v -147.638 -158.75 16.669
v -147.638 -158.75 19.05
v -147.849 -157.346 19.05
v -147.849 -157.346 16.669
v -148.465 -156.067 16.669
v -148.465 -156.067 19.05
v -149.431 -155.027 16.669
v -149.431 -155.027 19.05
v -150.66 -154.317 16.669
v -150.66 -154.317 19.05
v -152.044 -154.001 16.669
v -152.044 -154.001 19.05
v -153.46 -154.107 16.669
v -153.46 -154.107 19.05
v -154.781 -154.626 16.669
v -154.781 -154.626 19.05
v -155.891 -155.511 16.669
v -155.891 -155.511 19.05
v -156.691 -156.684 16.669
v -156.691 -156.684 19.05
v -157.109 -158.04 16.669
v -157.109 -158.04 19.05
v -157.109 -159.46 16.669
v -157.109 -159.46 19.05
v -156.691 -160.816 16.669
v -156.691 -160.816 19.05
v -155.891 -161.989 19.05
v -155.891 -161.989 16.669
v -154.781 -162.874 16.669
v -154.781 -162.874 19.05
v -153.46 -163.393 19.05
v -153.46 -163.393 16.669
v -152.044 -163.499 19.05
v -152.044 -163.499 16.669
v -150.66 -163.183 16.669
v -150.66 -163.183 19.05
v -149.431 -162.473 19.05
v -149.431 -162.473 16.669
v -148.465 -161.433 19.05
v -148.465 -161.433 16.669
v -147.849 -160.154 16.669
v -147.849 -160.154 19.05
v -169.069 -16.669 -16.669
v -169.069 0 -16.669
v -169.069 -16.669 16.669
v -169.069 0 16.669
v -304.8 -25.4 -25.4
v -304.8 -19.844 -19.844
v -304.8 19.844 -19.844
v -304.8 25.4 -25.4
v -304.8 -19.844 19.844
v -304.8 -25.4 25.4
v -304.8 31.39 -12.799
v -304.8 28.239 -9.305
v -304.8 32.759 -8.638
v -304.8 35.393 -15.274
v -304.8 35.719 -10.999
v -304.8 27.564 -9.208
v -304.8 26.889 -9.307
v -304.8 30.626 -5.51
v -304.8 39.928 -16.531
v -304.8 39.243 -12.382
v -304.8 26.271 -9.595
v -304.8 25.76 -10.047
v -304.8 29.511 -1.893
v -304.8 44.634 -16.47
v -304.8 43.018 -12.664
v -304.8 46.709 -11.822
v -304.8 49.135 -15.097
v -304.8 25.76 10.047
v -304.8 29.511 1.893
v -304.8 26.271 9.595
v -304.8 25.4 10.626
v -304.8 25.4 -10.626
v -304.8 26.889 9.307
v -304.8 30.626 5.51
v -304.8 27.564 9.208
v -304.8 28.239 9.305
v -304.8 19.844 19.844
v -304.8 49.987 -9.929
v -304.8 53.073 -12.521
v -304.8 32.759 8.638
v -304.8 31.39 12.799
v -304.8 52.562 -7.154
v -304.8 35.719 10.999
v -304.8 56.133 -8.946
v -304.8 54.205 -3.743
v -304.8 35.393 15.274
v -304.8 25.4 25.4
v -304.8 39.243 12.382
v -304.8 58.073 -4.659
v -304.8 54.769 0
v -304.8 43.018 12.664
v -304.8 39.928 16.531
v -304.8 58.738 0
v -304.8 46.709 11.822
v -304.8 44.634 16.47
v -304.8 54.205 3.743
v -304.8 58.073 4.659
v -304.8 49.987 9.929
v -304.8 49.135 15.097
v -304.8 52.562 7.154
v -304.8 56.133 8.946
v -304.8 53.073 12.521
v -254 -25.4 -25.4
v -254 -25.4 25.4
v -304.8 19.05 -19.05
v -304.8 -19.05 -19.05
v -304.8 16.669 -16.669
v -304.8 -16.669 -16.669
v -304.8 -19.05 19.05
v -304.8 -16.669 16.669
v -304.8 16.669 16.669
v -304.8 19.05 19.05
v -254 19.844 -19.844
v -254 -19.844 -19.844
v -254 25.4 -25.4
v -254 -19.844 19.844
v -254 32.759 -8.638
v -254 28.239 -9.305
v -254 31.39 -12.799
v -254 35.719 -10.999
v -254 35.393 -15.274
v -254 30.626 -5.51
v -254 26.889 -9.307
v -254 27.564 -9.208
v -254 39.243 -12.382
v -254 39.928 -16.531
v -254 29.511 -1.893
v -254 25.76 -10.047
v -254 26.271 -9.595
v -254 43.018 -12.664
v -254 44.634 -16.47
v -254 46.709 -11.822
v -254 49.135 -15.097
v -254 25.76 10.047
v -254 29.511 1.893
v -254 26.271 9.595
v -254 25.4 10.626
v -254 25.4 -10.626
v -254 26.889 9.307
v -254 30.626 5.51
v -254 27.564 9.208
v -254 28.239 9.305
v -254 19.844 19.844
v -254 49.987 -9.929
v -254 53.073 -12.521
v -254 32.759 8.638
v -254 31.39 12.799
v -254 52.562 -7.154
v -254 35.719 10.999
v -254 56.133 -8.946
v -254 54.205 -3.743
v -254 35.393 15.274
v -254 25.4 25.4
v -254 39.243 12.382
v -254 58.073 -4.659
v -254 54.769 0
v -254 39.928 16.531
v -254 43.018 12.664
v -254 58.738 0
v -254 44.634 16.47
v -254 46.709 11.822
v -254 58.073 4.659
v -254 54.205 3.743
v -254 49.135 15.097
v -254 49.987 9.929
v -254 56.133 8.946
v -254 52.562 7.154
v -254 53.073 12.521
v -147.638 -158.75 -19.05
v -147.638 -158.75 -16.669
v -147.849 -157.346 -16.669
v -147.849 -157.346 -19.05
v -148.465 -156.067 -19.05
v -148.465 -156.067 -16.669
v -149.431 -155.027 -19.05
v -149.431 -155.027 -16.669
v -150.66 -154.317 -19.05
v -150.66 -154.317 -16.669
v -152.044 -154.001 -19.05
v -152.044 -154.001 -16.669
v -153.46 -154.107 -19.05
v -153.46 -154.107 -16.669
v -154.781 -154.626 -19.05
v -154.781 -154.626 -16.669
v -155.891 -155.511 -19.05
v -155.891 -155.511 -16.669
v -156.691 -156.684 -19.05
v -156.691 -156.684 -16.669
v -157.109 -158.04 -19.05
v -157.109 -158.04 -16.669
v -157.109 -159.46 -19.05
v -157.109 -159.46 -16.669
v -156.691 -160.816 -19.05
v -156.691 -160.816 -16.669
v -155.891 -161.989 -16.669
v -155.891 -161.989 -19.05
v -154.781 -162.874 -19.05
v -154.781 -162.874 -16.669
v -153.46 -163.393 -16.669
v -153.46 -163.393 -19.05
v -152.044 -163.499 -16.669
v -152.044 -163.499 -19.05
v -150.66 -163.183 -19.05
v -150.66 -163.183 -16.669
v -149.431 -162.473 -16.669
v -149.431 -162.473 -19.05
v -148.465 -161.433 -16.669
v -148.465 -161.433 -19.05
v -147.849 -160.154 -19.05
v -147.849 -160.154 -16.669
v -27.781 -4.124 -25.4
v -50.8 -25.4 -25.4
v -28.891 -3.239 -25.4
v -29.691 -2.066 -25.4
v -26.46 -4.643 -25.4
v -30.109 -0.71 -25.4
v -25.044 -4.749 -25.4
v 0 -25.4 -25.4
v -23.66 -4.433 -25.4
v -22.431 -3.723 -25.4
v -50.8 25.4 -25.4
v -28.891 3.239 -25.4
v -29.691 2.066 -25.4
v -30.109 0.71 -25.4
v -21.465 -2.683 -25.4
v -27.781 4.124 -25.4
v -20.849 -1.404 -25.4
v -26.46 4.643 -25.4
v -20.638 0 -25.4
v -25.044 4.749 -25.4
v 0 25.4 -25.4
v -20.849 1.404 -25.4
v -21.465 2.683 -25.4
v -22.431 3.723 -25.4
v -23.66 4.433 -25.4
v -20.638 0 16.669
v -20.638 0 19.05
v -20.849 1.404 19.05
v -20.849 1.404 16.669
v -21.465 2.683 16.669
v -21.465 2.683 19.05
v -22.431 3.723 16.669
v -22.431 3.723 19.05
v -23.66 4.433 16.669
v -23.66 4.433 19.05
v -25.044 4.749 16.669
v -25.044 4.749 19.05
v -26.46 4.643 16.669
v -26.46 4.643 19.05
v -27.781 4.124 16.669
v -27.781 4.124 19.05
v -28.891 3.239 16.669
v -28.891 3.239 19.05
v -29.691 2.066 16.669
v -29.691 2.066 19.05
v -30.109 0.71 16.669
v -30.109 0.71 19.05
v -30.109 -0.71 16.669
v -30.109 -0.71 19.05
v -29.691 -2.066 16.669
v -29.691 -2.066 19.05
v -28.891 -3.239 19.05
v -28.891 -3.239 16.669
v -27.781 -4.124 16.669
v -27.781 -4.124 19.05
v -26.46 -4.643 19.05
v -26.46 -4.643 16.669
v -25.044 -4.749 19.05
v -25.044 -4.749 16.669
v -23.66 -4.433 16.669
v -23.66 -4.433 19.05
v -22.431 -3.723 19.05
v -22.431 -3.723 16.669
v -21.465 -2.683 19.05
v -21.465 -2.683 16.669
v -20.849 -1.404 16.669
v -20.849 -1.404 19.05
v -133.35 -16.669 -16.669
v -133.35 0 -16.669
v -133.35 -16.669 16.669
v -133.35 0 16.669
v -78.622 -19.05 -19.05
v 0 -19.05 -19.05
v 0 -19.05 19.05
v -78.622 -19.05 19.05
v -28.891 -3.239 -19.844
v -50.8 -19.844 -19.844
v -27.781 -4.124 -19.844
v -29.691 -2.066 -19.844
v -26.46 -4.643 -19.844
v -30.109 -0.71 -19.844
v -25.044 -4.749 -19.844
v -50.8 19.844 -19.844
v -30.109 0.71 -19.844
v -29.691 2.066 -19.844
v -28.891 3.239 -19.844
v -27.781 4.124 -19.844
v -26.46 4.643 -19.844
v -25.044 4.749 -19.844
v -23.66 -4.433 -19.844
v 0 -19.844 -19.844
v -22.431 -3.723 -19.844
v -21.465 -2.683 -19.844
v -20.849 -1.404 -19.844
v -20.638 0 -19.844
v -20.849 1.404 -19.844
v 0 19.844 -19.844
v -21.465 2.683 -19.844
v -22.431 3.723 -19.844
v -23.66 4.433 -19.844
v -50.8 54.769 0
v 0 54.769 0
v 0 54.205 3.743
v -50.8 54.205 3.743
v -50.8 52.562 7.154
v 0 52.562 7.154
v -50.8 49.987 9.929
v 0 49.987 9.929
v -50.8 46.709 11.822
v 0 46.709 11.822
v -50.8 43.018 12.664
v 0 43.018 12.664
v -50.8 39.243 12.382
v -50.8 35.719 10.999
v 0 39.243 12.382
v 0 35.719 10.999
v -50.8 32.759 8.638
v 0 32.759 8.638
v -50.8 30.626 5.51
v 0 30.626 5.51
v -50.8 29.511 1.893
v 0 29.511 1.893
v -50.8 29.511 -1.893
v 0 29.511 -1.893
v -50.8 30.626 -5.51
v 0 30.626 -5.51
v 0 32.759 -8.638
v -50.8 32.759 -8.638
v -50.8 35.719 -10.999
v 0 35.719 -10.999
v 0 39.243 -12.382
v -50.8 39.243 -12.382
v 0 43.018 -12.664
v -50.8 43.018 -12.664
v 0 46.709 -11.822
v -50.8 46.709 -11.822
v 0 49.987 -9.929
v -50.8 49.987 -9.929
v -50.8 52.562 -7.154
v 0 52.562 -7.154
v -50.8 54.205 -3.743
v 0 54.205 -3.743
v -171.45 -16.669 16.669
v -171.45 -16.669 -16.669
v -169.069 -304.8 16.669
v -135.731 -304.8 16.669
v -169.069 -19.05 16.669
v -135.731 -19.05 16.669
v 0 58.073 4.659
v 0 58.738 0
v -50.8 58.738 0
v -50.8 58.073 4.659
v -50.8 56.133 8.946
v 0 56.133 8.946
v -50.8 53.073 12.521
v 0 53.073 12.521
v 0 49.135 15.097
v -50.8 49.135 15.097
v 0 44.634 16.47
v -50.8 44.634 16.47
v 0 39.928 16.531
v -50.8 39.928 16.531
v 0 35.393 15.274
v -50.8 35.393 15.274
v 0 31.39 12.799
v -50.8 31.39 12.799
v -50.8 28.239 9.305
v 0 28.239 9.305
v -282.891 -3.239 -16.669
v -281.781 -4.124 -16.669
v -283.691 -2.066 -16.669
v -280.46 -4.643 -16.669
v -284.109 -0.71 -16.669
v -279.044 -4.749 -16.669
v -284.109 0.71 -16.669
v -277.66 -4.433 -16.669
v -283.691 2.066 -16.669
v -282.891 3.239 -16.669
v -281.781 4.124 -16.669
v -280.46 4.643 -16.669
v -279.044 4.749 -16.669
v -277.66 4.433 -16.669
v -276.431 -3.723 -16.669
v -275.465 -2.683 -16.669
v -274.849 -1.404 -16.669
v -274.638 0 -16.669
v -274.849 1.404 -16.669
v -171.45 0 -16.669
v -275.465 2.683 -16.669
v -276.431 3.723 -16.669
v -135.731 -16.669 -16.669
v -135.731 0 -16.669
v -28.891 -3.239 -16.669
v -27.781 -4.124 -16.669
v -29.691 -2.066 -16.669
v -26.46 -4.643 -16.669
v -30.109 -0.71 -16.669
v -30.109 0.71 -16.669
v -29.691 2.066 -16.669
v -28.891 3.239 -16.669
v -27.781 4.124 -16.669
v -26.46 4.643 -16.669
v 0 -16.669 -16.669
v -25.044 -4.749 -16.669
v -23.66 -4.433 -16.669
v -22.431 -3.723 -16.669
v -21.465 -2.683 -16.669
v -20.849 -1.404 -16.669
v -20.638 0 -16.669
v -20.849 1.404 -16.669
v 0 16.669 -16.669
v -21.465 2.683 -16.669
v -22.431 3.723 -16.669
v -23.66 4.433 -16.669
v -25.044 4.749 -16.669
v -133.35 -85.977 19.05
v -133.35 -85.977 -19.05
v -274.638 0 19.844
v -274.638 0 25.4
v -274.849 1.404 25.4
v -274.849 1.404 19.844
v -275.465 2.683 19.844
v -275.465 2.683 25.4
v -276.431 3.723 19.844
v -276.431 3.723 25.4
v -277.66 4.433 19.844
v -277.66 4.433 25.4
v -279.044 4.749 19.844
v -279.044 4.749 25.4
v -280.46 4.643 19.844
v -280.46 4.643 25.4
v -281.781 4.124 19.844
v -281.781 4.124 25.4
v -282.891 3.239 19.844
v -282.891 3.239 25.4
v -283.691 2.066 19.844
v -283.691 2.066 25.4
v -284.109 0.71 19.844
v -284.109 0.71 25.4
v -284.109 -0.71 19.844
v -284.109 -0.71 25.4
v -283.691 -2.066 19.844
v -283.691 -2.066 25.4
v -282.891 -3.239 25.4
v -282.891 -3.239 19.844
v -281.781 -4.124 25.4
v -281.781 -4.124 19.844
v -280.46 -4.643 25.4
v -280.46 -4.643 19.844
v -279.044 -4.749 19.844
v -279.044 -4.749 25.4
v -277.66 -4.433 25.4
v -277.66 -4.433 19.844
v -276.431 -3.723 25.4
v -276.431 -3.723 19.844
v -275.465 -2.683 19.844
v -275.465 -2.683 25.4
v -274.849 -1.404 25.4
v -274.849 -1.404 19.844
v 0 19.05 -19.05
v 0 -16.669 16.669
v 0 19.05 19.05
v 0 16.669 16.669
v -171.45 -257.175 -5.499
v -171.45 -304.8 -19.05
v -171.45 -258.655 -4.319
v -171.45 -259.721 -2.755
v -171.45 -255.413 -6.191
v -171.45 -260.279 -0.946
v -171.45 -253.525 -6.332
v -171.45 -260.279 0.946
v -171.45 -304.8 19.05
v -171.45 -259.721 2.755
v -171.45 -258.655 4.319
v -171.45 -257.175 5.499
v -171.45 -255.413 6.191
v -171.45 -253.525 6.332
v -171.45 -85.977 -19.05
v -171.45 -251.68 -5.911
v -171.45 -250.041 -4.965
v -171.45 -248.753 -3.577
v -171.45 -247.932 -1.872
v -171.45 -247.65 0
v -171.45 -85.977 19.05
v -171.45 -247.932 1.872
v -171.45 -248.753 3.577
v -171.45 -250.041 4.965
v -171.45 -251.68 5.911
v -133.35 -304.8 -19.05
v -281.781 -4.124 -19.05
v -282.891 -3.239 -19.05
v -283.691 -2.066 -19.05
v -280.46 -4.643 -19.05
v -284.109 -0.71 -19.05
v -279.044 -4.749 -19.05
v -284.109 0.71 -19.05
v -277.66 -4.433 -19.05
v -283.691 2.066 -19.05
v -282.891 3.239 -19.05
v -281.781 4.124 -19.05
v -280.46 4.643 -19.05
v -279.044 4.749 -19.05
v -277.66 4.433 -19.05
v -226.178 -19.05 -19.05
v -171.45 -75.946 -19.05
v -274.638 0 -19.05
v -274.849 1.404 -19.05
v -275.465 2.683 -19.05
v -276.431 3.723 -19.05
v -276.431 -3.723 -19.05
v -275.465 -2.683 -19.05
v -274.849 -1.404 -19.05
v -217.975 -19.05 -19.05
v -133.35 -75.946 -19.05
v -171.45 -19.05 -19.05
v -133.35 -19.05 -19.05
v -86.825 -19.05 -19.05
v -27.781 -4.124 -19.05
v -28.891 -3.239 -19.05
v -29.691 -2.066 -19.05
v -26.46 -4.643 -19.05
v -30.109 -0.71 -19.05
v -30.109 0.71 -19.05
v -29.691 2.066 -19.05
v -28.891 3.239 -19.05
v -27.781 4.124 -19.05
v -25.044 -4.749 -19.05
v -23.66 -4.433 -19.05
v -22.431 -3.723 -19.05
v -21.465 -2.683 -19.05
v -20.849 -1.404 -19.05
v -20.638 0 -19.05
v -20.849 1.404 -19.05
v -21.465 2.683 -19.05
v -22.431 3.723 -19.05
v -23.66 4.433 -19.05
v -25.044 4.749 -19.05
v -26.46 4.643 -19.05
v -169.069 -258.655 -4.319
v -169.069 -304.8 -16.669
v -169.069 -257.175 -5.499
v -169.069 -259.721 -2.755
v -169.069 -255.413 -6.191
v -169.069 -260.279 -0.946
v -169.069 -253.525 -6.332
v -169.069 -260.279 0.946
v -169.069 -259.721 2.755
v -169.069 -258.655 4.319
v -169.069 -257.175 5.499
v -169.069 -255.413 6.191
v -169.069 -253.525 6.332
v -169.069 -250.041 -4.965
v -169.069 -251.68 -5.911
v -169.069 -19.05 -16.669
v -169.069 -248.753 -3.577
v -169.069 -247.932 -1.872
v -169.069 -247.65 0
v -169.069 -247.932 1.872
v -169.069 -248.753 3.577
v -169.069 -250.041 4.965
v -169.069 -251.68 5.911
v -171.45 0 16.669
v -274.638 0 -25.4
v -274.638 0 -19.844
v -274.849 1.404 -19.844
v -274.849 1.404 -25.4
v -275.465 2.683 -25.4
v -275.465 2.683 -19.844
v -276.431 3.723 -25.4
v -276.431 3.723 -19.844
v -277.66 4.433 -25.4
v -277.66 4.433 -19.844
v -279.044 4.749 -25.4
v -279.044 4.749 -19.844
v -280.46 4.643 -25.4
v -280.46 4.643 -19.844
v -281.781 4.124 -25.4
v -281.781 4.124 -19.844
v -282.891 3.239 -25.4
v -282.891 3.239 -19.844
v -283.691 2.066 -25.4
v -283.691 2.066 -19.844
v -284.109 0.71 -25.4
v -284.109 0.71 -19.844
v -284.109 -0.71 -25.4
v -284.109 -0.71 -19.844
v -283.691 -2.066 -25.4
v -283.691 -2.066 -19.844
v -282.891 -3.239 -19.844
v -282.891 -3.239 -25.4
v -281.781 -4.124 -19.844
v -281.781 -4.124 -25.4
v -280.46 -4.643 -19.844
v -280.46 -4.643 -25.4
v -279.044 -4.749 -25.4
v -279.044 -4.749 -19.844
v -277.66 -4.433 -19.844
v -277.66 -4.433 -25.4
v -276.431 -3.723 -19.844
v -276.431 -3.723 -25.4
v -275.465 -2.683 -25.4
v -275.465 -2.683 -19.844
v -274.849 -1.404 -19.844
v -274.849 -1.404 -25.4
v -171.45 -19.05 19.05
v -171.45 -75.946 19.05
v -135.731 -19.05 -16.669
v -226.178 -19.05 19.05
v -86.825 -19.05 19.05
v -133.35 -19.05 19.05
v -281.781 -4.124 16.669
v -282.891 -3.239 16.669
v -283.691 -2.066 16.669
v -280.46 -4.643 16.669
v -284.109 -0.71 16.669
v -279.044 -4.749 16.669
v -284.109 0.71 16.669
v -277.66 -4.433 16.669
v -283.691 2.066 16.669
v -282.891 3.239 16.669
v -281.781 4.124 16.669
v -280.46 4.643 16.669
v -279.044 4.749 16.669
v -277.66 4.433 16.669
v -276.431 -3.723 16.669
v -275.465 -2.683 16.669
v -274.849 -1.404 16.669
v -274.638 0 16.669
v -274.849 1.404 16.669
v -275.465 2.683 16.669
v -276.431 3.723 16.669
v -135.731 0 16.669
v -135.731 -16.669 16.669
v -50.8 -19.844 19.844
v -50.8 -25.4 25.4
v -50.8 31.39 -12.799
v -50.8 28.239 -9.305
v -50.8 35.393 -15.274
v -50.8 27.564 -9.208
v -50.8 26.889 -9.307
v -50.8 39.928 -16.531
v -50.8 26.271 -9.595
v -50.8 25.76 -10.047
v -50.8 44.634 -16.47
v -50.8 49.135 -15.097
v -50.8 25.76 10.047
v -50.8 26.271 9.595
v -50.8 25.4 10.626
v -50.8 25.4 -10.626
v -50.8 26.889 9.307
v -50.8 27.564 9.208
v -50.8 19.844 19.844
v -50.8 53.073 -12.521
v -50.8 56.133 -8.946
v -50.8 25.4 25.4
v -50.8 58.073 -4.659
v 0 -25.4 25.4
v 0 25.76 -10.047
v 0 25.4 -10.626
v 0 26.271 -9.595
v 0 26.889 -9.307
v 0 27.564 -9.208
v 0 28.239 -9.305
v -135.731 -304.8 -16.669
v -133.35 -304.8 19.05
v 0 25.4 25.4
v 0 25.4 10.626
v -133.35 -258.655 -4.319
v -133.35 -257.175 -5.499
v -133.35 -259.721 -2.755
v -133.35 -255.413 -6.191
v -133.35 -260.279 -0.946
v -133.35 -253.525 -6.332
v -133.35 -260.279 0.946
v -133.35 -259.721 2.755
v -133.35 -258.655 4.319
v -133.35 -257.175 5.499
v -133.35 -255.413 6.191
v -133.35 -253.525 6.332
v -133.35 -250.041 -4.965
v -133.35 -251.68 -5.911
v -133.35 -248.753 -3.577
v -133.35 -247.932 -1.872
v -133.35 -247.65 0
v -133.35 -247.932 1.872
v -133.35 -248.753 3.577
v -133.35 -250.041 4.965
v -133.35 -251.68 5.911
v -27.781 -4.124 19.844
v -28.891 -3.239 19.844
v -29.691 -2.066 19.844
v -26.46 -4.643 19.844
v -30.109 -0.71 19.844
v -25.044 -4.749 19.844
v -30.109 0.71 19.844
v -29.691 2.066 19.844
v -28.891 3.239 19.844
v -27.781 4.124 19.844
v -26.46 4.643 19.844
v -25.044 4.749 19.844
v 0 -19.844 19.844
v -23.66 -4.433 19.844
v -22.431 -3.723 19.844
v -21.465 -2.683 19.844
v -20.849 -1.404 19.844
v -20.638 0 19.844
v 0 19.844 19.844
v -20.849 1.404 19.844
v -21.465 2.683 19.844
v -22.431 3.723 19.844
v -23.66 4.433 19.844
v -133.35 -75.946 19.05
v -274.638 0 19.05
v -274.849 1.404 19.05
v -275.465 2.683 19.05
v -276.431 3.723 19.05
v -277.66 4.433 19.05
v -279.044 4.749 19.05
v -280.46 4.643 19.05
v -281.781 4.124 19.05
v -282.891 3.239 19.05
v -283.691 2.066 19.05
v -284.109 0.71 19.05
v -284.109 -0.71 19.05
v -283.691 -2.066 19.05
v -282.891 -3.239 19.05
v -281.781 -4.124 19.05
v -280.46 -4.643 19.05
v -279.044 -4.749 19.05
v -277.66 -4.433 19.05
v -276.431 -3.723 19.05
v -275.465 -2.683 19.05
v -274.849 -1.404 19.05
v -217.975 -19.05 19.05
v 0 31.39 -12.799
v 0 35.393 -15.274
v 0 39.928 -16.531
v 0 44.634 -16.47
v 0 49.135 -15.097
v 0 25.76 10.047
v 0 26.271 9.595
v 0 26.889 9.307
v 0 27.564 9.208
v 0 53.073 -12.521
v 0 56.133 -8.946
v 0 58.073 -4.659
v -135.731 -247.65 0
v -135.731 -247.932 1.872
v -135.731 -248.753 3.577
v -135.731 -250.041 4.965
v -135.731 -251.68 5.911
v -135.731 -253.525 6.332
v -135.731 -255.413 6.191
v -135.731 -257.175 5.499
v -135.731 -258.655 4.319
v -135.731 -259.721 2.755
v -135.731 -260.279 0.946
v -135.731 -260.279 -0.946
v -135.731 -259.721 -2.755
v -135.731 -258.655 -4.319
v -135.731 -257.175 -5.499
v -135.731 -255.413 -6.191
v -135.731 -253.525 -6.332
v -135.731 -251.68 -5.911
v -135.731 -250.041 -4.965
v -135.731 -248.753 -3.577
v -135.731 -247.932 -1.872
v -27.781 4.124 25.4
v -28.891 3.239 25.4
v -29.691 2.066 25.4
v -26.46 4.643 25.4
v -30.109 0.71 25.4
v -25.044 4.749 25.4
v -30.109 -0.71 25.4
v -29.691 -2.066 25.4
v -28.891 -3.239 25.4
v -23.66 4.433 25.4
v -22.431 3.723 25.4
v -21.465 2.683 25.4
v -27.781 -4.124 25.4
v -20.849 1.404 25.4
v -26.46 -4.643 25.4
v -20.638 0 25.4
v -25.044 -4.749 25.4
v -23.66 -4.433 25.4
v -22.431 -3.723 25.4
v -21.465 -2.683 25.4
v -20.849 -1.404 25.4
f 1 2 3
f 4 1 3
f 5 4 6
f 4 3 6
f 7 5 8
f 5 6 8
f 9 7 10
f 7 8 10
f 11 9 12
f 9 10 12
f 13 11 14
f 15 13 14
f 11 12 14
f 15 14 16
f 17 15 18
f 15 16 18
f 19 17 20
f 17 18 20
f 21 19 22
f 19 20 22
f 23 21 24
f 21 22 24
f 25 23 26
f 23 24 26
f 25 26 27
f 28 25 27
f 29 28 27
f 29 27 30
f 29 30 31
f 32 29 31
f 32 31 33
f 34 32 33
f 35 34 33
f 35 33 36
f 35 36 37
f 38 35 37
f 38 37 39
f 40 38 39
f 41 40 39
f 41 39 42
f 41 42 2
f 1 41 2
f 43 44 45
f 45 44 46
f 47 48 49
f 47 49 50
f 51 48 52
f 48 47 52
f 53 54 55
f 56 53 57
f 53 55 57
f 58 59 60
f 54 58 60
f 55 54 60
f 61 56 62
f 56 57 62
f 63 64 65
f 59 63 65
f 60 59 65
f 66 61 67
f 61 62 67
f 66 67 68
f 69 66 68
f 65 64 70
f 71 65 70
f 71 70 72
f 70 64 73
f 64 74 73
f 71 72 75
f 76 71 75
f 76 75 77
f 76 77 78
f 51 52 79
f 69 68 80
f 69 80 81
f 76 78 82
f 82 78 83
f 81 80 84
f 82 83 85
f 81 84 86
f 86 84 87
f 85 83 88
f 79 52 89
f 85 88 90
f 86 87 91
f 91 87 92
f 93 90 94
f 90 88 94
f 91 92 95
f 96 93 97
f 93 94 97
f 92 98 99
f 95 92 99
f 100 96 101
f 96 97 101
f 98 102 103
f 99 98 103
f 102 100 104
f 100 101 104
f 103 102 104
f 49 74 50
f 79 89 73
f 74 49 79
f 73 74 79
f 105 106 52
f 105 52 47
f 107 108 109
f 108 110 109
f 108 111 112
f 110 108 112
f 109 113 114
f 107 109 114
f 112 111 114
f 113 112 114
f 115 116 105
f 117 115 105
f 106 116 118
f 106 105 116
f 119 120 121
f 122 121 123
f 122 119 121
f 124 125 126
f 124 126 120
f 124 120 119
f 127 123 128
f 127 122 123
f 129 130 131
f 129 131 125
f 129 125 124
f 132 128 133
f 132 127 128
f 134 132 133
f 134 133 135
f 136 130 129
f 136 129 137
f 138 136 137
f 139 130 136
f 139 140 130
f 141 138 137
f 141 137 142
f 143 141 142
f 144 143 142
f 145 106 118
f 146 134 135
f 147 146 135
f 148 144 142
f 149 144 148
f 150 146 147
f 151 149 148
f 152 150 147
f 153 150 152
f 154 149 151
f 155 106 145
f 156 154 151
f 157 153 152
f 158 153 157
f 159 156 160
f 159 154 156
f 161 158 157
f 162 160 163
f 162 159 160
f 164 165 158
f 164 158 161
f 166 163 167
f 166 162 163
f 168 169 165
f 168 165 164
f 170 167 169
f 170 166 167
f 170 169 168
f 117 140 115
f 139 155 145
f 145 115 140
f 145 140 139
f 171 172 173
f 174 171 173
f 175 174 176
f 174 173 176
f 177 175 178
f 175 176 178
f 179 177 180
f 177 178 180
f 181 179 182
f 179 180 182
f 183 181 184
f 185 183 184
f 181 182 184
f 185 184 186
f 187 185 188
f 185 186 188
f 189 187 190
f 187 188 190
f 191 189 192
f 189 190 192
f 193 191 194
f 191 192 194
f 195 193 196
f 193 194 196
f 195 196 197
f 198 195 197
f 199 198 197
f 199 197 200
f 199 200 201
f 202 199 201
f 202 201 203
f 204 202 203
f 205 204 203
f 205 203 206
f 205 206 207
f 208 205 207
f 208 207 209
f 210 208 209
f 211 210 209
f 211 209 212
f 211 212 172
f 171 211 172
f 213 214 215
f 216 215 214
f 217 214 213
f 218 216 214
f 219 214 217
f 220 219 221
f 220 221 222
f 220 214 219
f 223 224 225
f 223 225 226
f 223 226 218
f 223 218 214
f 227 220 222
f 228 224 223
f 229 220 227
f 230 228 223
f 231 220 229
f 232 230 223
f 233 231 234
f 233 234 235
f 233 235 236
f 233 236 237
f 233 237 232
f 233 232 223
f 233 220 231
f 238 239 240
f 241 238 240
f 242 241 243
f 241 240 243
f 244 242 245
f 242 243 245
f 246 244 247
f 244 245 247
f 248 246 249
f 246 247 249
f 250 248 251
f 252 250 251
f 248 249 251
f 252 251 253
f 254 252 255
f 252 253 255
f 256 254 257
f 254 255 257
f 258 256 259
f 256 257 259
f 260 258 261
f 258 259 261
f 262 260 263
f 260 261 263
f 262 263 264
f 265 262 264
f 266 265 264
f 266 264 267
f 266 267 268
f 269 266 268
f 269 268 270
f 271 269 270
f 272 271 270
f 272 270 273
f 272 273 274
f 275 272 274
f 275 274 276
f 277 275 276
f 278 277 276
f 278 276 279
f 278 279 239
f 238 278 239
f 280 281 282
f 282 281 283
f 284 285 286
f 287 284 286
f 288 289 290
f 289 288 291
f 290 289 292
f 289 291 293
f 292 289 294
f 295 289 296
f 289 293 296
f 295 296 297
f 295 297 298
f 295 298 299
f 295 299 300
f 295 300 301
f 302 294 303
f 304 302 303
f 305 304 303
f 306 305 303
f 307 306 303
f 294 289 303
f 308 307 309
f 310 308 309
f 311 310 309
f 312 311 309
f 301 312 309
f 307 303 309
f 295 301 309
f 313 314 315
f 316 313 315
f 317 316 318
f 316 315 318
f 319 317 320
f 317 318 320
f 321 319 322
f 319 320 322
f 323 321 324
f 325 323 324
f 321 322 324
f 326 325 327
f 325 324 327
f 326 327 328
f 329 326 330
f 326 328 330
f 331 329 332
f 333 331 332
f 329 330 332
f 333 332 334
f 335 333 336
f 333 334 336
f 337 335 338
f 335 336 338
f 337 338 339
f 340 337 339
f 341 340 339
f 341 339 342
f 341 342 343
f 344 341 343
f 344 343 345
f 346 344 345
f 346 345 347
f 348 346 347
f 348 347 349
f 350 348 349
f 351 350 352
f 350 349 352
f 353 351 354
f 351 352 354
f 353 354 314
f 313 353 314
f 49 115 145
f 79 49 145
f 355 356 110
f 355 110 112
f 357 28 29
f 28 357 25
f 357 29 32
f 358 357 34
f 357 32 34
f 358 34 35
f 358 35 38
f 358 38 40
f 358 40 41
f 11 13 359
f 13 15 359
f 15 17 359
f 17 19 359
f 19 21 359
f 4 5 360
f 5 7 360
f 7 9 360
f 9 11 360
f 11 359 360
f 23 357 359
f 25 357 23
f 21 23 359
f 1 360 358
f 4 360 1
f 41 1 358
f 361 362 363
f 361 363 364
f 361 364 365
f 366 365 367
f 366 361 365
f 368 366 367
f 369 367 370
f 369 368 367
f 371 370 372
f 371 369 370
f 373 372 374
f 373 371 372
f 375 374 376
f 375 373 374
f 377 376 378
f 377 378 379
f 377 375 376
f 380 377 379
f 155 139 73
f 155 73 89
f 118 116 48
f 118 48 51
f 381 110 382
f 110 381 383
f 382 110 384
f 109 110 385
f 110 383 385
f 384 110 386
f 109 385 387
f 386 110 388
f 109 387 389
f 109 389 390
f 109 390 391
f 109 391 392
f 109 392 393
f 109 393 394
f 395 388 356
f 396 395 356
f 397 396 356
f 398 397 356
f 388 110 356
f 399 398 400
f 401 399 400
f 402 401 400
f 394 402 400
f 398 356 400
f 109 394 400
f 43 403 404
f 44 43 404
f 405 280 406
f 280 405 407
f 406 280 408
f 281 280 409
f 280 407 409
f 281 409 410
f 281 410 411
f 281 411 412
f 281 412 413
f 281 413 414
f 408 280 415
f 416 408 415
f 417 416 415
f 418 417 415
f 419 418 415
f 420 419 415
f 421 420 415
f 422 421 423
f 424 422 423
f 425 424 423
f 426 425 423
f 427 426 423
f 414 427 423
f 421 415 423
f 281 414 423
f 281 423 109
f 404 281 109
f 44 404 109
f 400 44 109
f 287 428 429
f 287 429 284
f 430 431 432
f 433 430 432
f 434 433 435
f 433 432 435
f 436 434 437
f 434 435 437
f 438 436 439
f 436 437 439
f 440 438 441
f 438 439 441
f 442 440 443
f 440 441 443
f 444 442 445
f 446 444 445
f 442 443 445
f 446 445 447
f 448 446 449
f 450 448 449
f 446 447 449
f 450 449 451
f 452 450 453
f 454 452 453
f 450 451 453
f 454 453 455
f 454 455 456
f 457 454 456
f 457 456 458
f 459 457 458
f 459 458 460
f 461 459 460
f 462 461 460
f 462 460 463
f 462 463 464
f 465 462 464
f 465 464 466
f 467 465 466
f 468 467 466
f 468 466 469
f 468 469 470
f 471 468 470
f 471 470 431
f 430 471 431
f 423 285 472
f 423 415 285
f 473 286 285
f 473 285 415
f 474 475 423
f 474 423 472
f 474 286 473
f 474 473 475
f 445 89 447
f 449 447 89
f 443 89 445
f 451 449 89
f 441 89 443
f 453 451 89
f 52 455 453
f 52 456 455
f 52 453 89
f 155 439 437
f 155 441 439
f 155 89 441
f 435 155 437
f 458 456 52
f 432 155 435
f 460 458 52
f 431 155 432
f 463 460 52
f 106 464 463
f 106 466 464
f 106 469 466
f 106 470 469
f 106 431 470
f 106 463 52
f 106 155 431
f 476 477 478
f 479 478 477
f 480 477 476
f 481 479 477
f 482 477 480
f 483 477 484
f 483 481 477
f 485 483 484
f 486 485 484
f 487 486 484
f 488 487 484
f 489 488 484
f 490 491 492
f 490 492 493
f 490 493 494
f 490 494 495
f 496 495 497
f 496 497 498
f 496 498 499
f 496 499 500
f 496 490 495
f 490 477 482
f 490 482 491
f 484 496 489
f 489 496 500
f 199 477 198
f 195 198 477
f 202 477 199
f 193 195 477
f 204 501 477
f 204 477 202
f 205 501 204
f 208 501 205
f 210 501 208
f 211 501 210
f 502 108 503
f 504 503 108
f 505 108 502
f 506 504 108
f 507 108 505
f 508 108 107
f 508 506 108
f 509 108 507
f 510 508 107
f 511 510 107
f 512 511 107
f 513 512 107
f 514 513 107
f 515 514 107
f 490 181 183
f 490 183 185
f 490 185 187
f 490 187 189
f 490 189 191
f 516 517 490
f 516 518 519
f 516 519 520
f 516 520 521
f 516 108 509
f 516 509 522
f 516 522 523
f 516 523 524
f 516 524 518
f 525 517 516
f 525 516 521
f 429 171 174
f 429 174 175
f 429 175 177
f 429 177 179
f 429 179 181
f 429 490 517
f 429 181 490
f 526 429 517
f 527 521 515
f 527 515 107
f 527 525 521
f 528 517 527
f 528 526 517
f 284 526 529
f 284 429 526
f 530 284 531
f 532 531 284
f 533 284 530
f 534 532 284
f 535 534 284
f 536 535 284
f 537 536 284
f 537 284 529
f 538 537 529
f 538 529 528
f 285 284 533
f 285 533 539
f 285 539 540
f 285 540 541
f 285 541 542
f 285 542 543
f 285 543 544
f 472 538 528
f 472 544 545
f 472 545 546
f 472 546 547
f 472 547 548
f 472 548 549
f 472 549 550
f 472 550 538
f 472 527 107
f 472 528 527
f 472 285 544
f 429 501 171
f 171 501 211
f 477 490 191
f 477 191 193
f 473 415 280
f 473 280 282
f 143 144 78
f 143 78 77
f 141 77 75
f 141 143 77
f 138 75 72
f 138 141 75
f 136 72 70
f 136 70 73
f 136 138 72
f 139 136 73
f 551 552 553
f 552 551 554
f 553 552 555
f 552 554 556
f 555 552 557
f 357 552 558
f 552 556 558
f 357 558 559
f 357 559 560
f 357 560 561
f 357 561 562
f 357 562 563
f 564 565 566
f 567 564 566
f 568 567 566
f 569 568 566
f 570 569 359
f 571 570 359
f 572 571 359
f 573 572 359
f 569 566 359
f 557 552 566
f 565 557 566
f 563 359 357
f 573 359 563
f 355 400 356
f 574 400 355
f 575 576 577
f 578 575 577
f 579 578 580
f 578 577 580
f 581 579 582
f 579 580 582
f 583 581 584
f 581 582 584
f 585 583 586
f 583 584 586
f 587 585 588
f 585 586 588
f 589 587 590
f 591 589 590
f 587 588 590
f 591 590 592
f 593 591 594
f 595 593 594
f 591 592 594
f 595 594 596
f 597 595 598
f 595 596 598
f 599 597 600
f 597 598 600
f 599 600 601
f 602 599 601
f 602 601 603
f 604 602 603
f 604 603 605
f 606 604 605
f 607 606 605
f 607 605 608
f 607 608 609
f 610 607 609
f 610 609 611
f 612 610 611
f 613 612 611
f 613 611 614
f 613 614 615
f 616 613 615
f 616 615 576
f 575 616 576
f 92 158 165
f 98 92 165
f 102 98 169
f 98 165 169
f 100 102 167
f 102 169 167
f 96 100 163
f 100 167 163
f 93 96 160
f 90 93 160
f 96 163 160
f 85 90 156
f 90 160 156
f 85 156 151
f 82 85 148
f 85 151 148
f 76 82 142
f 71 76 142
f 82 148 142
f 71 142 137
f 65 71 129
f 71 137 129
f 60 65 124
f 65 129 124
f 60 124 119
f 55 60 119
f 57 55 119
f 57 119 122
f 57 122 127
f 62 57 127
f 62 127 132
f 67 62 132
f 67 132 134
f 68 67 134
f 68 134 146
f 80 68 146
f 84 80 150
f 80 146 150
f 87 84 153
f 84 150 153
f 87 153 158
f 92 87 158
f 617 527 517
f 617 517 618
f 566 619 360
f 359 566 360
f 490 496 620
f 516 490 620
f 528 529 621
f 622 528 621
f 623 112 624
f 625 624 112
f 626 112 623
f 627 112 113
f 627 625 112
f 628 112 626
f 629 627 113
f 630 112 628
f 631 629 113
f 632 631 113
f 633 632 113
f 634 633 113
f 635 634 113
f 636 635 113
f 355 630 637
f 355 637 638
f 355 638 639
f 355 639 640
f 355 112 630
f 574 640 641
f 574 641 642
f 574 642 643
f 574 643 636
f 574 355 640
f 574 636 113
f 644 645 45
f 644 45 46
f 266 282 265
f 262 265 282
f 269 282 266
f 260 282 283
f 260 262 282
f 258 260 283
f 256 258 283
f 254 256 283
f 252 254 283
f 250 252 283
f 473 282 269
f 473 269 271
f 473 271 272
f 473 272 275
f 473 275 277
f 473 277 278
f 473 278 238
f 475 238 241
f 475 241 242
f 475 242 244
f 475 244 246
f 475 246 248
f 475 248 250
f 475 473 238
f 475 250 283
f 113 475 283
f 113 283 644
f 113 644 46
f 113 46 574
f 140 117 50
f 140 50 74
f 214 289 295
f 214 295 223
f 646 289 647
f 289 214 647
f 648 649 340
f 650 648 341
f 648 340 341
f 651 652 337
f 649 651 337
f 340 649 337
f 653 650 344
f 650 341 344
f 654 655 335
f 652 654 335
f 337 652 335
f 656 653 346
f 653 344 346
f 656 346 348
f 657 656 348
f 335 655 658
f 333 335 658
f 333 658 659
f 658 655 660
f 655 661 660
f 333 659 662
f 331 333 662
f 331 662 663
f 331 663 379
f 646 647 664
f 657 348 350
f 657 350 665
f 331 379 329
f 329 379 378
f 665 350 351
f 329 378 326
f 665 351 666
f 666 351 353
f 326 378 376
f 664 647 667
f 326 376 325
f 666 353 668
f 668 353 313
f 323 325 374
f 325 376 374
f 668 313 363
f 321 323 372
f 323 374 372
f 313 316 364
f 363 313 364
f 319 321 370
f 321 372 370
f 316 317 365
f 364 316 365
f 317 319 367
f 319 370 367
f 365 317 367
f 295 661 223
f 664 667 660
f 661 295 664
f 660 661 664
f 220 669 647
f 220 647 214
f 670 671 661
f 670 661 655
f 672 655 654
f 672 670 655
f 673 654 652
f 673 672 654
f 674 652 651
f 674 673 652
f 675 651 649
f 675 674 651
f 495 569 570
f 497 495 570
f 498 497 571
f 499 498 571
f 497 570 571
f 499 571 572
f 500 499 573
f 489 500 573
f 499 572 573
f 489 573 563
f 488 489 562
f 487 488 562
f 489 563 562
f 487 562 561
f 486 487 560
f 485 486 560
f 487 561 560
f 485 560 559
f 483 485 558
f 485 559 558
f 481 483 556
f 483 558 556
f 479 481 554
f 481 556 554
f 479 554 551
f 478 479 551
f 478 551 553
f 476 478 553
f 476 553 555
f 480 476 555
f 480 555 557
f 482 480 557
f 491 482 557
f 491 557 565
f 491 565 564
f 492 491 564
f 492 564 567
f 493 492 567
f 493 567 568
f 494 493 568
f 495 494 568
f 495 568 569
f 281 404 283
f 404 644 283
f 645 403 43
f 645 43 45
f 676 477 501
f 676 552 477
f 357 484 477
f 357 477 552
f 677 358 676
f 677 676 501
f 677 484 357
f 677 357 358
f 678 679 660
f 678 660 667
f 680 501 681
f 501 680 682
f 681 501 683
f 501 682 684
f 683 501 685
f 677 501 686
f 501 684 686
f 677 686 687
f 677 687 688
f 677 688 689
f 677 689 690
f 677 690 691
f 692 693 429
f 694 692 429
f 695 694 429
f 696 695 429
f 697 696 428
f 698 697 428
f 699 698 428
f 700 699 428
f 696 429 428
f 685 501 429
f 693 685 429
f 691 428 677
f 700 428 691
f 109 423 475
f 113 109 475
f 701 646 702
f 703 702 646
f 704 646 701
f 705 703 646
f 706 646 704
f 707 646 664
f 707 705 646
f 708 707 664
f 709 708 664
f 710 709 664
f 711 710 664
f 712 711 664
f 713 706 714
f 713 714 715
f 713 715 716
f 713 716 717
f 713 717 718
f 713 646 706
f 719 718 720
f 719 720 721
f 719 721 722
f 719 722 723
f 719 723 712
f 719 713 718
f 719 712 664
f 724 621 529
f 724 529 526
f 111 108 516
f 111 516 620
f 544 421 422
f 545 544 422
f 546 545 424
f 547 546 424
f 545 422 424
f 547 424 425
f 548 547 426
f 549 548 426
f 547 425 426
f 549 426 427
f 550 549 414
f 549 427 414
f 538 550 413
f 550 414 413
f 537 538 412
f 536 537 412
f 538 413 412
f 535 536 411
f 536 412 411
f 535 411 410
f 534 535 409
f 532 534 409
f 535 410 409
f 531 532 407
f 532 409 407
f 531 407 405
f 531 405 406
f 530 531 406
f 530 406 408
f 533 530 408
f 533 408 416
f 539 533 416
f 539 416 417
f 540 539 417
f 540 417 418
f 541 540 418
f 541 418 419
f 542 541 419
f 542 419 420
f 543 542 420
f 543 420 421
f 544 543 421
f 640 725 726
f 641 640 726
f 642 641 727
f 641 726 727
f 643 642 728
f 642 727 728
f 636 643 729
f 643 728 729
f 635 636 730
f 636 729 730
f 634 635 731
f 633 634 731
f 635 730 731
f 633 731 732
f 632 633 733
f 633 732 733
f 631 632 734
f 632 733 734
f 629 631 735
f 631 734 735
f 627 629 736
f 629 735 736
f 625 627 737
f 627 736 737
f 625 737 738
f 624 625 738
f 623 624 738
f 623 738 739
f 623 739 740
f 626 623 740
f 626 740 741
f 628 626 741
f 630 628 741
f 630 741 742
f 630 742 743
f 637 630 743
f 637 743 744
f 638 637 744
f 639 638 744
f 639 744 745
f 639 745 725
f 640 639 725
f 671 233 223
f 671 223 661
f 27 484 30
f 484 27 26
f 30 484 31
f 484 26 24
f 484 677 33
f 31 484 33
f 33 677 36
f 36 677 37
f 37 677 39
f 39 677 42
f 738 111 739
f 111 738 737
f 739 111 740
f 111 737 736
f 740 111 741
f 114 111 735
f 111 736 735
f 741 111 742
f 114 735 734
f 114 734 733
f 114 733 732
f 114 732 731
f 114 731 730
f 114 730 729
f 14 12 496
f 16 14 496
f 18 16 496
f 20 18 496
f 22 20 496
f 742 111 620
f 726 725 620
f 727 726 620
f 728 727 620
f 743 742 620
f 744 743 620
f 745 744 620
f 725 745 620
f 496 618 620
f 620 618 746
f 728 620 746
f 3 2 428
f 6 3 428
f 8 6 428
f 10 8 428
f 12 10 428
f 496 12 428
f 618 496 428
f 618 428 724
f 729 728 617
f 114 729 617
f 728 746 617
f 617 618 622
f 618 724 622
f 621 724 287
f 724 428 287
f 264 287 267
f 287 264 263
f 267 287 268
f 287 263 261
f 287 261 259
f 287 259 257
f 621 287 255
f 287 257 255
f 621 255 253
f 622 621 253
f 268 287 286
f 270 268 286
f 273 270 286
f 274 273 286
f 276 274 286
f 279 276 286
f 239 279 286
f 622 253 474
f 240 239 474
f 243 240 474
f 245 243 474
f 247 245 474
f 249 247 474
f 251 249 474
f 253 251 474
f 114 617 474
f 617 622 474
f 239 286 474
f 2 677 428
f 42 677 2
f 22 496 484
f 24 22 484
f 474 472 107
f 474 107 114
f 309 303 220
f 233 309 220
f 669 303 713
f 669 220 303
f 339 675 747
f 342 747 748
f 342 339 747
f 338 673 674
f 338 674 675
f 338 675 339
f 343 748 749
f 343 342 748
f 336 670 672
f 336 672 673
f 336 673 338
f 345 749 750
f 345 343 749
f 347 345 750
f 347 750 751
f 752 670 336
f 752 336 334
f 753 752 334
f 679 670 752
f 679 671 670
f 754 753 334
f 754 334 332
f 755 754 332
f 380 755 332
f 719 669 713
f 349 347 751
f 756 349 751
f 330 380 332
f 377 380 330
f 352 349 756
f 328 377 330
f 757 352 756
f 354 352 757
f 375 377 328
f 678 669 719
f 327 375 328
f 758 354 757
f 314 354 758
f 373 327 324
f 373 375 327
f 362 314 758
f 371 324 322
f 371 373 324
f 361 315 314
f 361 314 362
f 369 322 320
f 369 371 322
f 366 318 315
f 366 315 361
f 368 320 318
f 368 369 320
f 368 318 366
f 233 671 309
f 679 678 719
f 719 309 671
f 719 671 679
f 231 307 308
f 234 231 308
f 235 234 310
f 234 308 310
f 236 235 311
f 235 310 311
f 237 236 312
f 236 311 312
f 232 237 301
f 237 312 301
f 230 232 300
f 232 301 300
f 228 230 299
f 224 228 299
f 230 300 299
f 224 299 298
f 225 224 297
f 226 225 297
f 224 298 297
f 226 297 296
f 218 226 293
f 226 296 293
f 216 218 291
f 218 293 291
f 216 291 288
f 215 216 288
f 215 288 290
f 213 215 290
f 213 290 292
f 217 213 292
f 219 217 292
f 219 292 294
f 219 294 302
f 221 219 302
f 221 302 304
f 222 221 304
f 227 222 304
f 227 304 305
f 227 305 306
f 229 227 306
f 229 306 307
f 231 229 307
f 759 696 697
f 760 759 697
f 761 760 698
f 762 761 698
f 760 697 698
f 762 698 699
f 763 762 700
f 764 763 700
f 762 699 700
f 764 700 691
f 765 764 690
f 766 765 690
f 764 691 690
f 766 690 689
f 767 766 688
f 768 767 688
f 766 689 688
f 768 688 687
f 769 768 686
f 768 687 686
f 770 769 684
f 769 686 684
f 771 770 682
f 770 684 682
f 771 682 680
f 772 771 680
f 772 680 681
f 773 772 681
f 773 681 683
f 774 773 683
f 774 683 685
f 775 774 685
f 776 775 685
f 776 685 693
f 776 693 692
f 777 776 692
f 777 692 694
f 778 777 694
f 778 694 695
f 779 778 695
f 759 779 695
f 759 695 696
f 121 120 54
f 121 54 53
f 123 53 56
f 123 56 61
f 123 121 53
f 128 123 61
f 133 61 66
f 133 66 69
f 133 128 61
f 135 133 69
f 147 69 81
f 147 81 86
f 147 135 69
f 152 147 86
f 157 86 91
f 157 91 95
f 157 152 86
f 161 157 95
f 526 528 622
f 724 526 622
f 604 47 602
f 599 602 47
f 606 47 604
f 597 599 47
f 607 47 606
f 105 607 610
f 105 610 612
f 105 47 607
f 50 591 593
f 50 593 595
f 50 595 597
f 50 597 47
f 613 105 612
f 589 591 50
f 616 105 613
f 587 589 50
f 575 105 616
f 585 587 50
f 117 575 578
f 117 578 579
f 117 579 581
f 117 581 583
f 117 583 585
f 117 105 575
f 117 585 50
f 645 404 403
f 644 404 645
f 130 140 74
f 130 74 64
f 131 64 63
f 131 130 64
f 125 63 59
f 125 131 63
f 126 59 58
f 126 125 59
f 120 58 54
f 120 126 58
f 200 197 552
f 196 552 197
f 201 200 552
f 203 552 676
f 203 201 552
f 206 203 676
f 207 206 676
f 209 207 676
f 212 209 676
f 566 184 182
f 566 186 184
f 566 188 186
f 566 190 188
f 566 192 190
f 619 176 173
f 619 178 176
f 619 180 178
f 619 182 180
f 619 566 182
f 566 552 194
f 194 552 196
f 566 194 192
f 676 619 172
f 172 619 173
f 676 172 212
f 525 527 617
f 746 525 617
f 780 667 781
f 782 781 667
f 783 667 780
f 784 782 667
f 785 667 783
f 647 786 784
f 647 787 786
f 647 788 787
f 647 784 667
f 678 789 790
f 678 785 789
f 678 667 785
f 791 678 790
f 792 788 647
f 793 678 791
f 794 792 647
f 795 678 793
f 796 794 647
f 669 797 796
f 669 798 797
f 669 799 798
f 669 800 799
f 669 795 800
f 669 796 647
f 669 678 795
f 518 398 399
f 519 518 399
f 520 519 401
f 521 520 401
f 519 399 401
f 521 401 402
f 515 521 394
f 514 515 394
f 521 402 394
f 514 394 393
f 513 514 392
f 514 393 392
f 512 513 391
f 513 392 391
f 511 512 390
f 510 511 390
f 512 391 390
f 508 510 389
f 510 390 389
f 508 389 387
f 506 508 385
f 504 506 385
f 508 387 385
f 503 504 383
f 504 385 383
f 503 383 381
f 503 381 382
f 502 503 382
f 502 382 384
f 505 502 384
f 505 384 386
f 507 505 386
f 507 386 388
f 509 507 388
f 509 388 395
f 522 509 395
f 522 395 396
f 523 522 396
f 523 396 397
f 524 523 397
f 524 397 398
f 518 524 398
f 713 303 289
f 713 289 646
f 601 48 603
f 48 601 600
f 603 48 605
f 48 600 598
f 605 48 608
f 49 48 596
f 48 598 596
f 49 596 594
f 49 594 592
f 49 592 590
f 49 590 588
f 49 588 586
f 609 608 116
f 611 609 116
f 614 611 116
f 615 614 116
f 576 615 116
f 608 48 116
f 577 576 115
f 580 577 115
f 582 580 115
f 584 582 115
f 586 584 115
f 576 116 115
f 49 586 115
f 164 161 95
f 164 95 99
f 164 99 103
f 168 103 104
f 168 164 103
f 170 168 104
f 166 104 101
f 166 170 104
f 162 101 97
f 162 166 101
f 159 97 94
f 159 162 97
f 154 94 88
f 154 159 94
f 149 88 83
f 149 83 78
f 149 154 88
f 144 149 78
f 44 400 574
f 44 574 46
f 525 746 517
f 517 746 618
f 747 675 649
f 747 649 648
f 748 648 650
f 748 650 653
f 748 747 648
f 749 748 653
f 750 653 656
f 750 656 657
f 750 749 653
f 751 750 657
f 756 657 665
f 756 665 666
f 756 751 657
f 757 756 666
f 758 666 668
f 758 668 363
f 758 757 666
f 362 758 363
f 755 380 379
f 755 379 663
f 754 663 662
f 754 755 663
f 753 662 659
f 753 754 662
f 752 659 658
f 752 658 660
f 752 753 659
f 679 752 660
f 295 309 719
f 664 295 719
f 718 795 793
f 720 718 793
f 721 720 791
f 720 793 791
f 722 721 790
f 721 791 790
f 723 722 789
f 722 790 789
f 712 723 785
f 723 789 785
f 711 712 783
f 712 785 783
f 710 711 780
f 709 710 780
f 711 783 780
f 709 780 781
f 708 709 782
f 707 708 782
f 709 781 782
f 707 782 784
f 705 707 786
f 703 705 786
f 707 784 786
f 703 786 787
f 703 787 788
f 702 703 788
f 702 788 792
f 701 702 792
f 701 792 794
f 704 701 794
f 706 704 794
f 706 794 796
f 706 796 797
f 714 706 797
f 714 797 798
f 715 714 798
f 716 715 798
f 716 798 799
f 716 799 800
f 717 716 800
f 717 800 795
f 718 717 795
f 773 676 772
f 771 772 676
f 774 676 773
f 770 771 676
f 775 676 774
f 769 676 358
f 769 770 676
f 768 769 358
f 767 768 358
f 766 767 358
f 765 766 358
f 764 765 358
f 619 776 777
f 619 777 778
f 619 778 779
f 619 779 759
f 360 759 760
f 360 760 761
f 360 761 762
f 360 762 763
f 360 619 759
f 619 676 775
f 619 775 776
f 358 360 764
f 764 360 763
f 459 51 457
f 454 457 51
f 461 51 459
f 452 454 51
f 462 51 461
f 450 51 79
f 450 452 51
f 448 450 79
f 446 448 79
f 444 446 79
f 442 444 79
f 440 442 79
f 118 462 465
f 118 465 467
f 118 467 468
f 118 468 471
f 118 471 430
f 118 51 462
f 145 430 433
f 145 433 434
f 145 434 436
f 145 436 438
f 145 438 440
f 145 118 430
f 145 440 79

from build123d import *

# Parameters (mm, degrees)
F0_W      = 38.1
F0_H      = 38.1
F0_W_2    = 33.3375
F0_H_2    = 33.3375
F1_DEPTH  = 304.8
F2_W      = 38.1
F2_H      = 38.1
F2_W_2    = 33.3375
F2_H_2    = 33.3375
F3_DEPTH  = 304.8
F4_W      = 39.6875
F4_H      = 39.6875
F4_R      = 12.7
F5_DEPTH  = 50.8
F7_R      = 4.7625
F8_DEPTH  = 50.801
F9_R      = 4.7625
F10_DEPTH = 50.801
F11_R     = 6.35
F12_DEPTH = 171.451
F15_DEPTH = 38.1
F16_R     = 4.7625
F17_DEPTH = 44.451


# Not quite as in the source:
# - a pattern or mirror of a feature is missing from the dataset's text; its kind, count and spacing are read off the source's solid
# - a feature names something its author has since deleted; it is built from what else it names


with BuildPart() as f1:
    # F0 (on Right) → F1 (new body)
    with BuildSketch(Plane.YZ):
        Rectangle(F0_W, F0_H)
        Rectangle(F0_W_2, F0_H_2, mode=Mode.SUBTRACT)
    extrude(amount=-F1_DEPTH)

    # F2 (on Front) → F3 (join)
    with BuildSketch(Plane.XZ):
        with Locations((-152.4, 0)):
            Rectangle(F2_W, F2_H)
        with Locations((-152.4, 0)):
            Rectangle(F2_W_2, F2_H_2, mode=Mode.SUBTRACT)
    extrude(amount=F3_DEPTH)


with BuildPart() as f5:
    # F4 (on Right) → F5 (new body)
    with BuildSketch(Plane.YZ):
        Polygon((25.4, 10.626129806), (25.4, 25.4), (-25.4, 25.4), (-25.4, -25.4), (25.4, -25.4), (25.4, -10.626129806), (25.4, -1.82e-08), align=None)
        Rectangle(F4_W, F4_H, mode=Mode.SUBTRACT)
        with BuildLine():
            ThreePointArc((28.2387536196, 9.3047529082), (26.5696544388, 9.428955298), (25.4, 10.626129806))
            Line((25.4, 10.626129806), (25.4, -1.82e-08))
            ThreePointArc((25.4, -1.82e-08), (26.1254758868, 4.864076183), (28.2387536196, 9.3047529082))
        make_face()
        with BuildLine():
            ThreePointArc((28.2387536196, -9.3047529082), (26.1254758921, -4.8640762004), (25.4, -1.82e-08))
            Line((25.4, -1.82e-08), (25.4, -10.626129806))
            ThreePointArc((25.4, -10.626129806), (26.5696544388, -9.428955298), (28.2387536196, -9.3047529082))
        make_face()
        with BuildLine():
            ThreePointArc((28.2387536196, 9.3047529082), (26.1254758868, 4.864076183), (25.4, -1.82e-08))
            ThreePointArc((25.4, -1.82e-08), (26.1254758921, -4.8640762004), (28.2387536196, -9.3047529082))
            ThreePointArc((28.2387536196, -9.3047529082), (46.9328261917, -15.9432741105), (58.7375, 0))
            ThreePointArc((58.7375, 0), (46.9328261917, 15.9432741105), (28.2387536196, 9.3047529082))
        make_face()
        with Locations((42.06875, 0)):
            Circle(F4_R, mode=Mode.SUBTRACT)
    extrude(amount=-F5_DEPTH)


with BuildPart() as f6_1:
    # F6: copy of F5
    add(f5.part.moved(Location((-254, 0, 0))))


with BuildPart() as f8_tool:
    # F7 (on face) → F8 (new body, through all)
    with BuildSketch(Plane.XY.offset(25.4)):
        with Locations((-25.4, 0)):
            Circle(F7_R)
    extrude(amount=-F8_DEPTH)


with BuildPart() as f1_1:
    add(f1.part)

    # F8: cut by f8_tool
    add(f8_tool.part, mode=Mode.SUBTRACT)


with BuildPart() as f5_1:
    add(f5.part)

    # F8: cut by f8_tool
    add(f8_tool.part, mode=Mode.SUBTRACT)


with BuildPart() as f10_tool:
    # F9 (on face) → F10 (new body, through all)
    with BuildSketch(Plane.XY.offset(25.4)):
        with Locations((-279.4, 0)):
            Circle(F9_R)
    extrude(amount=-F10_DEPTH)


with BuildPart() as f1_2:
    add(f1_1.part)

    # F10: cut by f10_tool
    add(f10_tool.part, mode=Mode.SUBTRACT)

    # F11 (on face) → F12 (cut, through all)
    with BuildSketch(Plane.YZ.offset(-133.35)):
        with Locations((-254, 0)):
            Circle(F11_R)
    extrude(amount=-F12_DEPTH, mode=Mode.SUBTRACT)

    # F13 (on face) → F15 (join)
    with BuildSketch(Plane.XY.offset(19.05)):
        Polygon((-78.6219015718, -19.05), (-86.8246659974, -19.05), (-133.35, -75.9458216504), (-133.35, -85.9769806266), align=None)
    f15 = extrude(amount=-F15_DEPTH)

    # F15_copies: F15 across plane
    add(f15.mirror(Plane(origin=(-152.4, 0, 0), x_dir=(0, 0, -1), z_dir=(-1, 0, 0))))

    # F16 (on face) → F17 (cut, through all)
    with BuildSketch(Plane.XY.offset(19.05)):
        with Locations((-152.4, -158.75)):
            Circle(F16_R)
    extrude(amount=-F17_DEPTH, mode=Mode.SUBTRACT)


with BuildPart() as f6_1_1:
    add(f6_1.part)

    # F10: cut by f10_tool
    add(f10_tool.part, mode=Mode.SUBTRACT)


solid = Compound([f5_1.part, f1_2.part, f6_1_1.part])
